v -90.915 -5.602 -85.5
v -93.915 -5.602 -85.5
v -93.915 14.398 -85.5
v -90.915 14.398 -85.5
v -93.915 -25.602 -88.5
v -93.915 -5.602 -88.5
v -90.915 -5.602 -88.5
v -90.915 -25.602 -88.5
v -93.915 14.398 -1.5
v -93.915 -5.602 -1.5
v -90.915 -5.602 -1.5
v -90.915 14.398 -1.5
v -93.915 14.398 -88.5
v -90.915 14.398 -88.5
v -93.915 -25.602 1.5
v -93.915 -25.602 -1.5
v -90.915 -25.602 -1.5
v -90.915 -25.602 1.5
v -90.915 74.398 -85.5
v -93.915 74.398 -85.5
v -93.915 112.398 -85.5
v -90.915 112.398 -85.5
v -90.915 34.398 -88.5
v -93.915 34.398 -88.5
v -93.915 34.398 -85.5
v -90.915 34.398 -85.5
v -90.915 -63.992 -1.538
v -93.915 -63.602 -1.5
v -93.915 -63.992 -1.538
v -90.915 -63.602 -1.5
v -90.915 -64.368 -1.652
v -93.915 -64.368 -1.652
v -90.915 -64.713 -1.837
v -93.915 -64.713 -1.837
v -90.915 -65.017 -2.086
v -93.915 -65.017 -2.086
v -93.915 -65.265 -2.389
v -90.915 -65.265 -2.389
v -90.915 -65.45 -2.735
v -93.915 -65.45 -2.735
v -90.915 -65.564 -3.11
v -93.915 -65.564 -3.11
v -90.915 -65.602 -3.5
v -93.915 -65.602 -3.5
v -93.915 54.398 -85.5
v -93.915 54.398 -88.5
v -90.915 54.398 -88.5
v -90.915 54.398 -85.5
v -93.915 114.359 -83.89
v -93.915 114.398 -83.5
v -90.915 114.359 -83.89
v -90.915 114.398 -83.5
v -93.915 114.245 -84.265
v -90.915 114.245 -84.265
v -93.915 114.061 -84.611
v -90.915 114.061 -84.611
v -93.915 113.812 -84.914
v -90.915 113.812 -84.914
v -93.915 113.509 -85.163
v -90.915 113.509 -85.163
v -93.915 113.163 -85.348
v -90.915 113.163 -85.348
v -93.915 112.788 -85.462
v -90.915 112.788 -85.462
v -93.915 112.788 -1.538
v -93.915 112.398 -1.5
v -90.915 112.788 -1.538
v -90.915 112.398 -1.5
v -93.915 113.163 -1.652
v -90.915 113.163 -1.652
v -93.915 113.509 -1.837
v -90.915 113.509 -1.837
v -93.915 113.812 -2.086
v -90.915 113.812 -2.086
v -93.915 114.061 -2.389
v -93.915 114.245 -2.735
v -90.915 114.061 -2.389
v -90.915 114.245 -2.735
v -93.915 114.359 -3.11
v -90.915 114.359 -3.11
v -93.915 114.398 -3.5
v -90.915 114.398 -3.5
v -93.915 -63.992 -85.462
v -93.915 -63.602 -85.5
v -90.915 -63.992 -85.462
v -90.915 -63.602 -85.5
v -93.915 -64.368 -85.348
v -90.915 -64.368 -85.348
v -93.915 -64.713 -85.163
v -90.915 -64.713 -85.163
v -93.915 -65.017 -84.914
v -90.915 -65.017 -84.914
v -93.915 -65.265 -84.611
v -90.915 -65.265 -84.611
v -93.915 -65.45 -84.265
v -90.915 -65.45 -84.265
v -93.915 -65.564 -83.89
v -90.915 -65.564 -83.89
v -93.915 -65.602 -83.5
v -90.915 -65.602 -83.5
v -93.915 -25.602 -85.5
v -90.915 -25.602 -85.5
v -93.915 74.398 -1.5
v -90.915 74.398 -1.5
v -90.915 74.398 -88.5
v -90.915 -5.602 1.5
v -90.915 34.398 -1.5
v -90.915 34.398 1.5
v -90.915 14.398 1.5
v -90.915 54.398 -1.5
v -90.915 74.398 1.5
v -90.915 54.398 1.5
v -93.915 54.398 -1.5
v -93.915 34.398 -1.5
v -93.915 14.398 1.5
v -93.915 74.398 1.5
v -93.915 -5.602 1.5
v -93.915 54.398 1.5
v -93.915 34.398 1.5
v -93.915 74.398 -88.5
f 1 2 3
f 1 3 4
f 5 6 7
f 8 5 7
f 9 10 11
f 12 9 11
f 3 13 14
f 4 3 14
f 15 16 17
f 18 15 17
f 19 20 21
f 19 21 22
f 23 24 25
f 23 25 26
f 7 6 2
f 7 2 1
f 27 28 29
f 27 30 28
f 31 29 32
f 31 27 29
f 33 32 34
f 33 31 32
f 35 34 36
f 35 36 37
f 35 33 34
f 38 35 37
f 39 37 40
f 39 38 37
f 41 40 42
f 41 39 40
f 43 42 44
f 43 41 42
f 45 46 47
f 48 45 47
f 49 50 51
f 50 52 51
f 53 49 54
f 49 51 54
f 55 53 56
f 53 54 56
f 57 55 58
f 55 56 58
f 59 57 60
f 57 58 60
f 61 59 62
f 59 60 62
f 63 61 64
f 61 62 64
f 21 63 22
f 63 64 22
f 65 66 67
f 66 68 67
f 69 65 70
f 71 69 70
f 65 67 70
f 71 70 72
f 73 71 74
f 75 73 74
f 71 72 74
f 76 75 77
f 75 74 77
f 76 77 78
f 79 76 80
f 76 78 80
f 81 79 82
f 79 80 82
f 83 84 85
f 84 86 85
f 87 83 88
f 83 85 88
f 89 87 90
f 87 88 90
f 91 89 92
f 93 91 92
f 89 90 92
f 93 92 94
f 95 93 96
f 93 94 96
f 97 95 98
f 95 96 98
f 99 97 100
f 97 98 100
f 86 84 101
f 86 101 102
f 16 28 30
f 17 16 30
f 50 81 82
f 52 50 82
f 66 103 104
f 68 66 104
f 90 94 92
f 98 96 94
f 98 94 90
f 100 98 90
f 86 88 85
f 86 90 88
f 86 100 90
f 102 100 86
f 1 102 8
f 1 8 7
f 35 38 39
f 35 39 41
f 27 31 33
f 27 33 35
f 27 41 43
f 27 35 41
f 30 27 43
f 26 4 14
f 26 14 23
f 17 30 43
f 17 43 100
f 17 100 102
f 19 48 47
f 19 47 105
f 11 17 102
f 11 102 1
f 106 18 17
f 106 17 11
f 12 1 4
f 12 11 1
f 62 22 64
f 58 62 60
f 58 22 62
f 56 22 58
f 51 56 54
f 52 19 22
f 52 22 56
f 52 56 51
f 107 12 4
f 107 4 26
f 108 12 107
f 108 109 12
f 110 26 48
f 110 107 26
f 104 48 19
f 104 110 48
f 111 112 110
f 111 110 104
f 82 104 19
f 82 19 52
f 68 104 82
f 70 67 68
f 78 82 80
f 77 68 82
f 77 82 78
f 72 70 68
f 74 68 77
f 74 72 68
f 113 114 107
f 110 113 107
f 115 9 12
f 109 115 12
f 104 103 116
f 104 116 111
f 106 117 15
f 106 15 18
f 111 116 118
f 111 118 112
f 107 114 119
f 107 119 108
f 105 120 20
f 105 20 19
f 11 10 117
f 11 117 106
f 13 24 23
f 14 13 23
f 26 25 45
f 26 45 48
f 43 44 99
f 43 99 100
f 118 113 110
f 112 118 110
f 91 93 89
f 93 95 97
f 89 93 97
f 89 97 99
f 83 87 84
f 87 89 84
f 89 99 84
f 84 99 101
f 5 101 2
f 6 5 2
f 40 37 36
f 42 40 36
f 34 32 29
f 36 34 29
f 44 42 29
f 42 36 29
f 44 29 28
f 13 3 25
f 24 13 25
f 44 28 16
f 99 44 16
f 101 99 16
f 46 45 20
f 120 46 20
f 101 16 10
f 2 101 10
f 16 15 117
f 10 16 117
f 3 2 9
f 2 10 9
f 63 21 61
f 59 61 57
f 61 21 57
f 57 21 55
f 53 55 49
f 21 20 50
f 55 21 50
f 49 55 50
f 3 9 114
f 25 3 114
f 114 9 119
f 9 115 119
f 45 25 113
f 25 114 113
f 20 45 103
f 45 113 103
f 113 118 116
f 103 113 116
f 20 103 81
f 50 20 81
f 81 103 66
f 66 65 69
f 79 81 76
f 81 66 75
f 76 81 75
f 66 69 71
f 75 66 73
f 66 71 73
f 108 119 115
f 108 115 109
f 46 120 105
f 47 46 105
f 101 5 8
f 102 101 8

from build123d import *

# Parameters (mm, degrees)
SKETCH1_W           = 3
SKETCH1_H           = 180
EXTRUDE_THIN1_DEPTH = 90
CAVITY1_START       = -65.602294015
CAVITY1_OUTLINE_W   = 3
CAVITY1_OUTLINE_H   = 3
CAVITY1_DEPTH       = 40
CAVITY1_START_2     = 74.397705985
CAVITY1_2_OUTLINE_W = 3
CAVITY1_2_OUTLINE_H = 3
CAVITY1_2_DEPTH     = 40
CAVITY1_START_3     = -5.602294015
CAVITY1_3_OUTLINE_W = 3
CAVITY1_3_OUTLINE_H = 3
CAVITY1_3_DEPTH     = 20
CAVITY1_START_4     = 34.397705985
CAVITY1_4_OUTLINE_W = 3
CAVITY1_4_OUTLINE_H = 3
CAVITY1_4_DEPTH     = 20
FILLET1_R           = 2


# Read off the part's stored shape, not the designer's step: Cavity1
with BuildPart() as part:
    # Sketch1 → Extrude-Thin1 (new body)
    with BuildSketch(Plane.XY.offset(1.5)):
        with Locations((-92.414893617, 24.397705985)):
            Rectangle(SKETCH1_W, SKETCH1_H)
    extrude(amount=-EXTRUDE_THIN1_DEPTH)

    # Cavity1 outline → Cavity1 (cut)
    with BuildSketch(Plane(origin=(0, 0, 0), x_dir=(1, 0, 0), z_dir=(0, 1, 0)).offset(CAVITY1_START)):
        with Locations((-92.414893617, 87)):
            Rectangle(CAVITY1_OUTLINE_W, CAVITY1_OUTLINE_H)
        with Locations((-92.414893617, 0)):
            Rectangle(CAVITY1_OUTLINE_W, CAVITY1_OUTLINE_H)
    extrude(amount=CAVITY1_DEPTH, mode=Mode.SUBTRACT)

    # Cavity1 2 outline → Cavity1 2 (cut)
    with BuildSketch(Plane(origin=(0, 0, 0), x_dir=(1, 0, 0), z_dir=(0, 1, 0)).offset(CAVITY1_START_2)):
        with Locations((-92.414893617, 87)):
            Rectangle(CAVITY1_2_OUTLINE_W, CAVITY1_2_OUTLINE_H)
        with Locations((-92.414893617, 0)):
            Rectangle(CAVITY1_2_OUTLINE_W, CAVITY1_2_OUTLINE_H)
    extrude(amount=CAVITY1_2_DEPTH, mode=Mode.SUBTRACT)

    # Cavity1 3 outline → Cavity1 3 (cut)
    with BuildSketch(Plane(origin=(0, 0, 0), x_dir=(1, 0, 0), z_dir=(0, 1, 0)).offset(CAVITY1_START_3)):
        with Locations((-92.414893617, 87)):
            Rectangle(CAVITY1_3_OUTLINE_W, CAVITY1_3_OUTLINE_H)
        with Locations((-92.414893617, 0)):
            Rectangle(CAVITY1_3_OUTLINE_W, CAVITY1_3_OUTLINE_H)
    extrude(amount=CAVITY1_3_DEPTH, mode=Mode.SUBTRACT)

    # Cavity1 4 outline → Cavity1 4 (cut)
    with BuildSketch(Plane(origin=(0, 0, 0), x_dir=(1, 0, 0), z_dir=(0, 1, 0)).offset(CAVITY1_START_4)):
        with Locations((-92.414893617, 87)):
            Rectangle(CAVITY1_4_OUTLINE_W, CAVITY1_4_OUTLINE_H)
        with Locations((-92.414893617, 0)):
            Rectangle(CAVITY1_4_OUTLINE_W, CAVITY1_4_OUTLINE_H)
    extrude(amount=CAVITY1_4_DEPTH, mode=Mode.SUBTRACT)

    # Fillet1
    fillet1_edges = [part.edges().sort_by_distance(p)[0] for p in [
        (-92.414893617, -65.602294015, -85.5),
        (-92.414893617, 114.397705985, -85.5),
        (-92.414893617, 114.397705985, -1.5),
        (-92.414893617, -65.602294015, -1.5),
    ]]
    fillet(fillet1_edges, radius=FILLET1_R)


solid = part.part
